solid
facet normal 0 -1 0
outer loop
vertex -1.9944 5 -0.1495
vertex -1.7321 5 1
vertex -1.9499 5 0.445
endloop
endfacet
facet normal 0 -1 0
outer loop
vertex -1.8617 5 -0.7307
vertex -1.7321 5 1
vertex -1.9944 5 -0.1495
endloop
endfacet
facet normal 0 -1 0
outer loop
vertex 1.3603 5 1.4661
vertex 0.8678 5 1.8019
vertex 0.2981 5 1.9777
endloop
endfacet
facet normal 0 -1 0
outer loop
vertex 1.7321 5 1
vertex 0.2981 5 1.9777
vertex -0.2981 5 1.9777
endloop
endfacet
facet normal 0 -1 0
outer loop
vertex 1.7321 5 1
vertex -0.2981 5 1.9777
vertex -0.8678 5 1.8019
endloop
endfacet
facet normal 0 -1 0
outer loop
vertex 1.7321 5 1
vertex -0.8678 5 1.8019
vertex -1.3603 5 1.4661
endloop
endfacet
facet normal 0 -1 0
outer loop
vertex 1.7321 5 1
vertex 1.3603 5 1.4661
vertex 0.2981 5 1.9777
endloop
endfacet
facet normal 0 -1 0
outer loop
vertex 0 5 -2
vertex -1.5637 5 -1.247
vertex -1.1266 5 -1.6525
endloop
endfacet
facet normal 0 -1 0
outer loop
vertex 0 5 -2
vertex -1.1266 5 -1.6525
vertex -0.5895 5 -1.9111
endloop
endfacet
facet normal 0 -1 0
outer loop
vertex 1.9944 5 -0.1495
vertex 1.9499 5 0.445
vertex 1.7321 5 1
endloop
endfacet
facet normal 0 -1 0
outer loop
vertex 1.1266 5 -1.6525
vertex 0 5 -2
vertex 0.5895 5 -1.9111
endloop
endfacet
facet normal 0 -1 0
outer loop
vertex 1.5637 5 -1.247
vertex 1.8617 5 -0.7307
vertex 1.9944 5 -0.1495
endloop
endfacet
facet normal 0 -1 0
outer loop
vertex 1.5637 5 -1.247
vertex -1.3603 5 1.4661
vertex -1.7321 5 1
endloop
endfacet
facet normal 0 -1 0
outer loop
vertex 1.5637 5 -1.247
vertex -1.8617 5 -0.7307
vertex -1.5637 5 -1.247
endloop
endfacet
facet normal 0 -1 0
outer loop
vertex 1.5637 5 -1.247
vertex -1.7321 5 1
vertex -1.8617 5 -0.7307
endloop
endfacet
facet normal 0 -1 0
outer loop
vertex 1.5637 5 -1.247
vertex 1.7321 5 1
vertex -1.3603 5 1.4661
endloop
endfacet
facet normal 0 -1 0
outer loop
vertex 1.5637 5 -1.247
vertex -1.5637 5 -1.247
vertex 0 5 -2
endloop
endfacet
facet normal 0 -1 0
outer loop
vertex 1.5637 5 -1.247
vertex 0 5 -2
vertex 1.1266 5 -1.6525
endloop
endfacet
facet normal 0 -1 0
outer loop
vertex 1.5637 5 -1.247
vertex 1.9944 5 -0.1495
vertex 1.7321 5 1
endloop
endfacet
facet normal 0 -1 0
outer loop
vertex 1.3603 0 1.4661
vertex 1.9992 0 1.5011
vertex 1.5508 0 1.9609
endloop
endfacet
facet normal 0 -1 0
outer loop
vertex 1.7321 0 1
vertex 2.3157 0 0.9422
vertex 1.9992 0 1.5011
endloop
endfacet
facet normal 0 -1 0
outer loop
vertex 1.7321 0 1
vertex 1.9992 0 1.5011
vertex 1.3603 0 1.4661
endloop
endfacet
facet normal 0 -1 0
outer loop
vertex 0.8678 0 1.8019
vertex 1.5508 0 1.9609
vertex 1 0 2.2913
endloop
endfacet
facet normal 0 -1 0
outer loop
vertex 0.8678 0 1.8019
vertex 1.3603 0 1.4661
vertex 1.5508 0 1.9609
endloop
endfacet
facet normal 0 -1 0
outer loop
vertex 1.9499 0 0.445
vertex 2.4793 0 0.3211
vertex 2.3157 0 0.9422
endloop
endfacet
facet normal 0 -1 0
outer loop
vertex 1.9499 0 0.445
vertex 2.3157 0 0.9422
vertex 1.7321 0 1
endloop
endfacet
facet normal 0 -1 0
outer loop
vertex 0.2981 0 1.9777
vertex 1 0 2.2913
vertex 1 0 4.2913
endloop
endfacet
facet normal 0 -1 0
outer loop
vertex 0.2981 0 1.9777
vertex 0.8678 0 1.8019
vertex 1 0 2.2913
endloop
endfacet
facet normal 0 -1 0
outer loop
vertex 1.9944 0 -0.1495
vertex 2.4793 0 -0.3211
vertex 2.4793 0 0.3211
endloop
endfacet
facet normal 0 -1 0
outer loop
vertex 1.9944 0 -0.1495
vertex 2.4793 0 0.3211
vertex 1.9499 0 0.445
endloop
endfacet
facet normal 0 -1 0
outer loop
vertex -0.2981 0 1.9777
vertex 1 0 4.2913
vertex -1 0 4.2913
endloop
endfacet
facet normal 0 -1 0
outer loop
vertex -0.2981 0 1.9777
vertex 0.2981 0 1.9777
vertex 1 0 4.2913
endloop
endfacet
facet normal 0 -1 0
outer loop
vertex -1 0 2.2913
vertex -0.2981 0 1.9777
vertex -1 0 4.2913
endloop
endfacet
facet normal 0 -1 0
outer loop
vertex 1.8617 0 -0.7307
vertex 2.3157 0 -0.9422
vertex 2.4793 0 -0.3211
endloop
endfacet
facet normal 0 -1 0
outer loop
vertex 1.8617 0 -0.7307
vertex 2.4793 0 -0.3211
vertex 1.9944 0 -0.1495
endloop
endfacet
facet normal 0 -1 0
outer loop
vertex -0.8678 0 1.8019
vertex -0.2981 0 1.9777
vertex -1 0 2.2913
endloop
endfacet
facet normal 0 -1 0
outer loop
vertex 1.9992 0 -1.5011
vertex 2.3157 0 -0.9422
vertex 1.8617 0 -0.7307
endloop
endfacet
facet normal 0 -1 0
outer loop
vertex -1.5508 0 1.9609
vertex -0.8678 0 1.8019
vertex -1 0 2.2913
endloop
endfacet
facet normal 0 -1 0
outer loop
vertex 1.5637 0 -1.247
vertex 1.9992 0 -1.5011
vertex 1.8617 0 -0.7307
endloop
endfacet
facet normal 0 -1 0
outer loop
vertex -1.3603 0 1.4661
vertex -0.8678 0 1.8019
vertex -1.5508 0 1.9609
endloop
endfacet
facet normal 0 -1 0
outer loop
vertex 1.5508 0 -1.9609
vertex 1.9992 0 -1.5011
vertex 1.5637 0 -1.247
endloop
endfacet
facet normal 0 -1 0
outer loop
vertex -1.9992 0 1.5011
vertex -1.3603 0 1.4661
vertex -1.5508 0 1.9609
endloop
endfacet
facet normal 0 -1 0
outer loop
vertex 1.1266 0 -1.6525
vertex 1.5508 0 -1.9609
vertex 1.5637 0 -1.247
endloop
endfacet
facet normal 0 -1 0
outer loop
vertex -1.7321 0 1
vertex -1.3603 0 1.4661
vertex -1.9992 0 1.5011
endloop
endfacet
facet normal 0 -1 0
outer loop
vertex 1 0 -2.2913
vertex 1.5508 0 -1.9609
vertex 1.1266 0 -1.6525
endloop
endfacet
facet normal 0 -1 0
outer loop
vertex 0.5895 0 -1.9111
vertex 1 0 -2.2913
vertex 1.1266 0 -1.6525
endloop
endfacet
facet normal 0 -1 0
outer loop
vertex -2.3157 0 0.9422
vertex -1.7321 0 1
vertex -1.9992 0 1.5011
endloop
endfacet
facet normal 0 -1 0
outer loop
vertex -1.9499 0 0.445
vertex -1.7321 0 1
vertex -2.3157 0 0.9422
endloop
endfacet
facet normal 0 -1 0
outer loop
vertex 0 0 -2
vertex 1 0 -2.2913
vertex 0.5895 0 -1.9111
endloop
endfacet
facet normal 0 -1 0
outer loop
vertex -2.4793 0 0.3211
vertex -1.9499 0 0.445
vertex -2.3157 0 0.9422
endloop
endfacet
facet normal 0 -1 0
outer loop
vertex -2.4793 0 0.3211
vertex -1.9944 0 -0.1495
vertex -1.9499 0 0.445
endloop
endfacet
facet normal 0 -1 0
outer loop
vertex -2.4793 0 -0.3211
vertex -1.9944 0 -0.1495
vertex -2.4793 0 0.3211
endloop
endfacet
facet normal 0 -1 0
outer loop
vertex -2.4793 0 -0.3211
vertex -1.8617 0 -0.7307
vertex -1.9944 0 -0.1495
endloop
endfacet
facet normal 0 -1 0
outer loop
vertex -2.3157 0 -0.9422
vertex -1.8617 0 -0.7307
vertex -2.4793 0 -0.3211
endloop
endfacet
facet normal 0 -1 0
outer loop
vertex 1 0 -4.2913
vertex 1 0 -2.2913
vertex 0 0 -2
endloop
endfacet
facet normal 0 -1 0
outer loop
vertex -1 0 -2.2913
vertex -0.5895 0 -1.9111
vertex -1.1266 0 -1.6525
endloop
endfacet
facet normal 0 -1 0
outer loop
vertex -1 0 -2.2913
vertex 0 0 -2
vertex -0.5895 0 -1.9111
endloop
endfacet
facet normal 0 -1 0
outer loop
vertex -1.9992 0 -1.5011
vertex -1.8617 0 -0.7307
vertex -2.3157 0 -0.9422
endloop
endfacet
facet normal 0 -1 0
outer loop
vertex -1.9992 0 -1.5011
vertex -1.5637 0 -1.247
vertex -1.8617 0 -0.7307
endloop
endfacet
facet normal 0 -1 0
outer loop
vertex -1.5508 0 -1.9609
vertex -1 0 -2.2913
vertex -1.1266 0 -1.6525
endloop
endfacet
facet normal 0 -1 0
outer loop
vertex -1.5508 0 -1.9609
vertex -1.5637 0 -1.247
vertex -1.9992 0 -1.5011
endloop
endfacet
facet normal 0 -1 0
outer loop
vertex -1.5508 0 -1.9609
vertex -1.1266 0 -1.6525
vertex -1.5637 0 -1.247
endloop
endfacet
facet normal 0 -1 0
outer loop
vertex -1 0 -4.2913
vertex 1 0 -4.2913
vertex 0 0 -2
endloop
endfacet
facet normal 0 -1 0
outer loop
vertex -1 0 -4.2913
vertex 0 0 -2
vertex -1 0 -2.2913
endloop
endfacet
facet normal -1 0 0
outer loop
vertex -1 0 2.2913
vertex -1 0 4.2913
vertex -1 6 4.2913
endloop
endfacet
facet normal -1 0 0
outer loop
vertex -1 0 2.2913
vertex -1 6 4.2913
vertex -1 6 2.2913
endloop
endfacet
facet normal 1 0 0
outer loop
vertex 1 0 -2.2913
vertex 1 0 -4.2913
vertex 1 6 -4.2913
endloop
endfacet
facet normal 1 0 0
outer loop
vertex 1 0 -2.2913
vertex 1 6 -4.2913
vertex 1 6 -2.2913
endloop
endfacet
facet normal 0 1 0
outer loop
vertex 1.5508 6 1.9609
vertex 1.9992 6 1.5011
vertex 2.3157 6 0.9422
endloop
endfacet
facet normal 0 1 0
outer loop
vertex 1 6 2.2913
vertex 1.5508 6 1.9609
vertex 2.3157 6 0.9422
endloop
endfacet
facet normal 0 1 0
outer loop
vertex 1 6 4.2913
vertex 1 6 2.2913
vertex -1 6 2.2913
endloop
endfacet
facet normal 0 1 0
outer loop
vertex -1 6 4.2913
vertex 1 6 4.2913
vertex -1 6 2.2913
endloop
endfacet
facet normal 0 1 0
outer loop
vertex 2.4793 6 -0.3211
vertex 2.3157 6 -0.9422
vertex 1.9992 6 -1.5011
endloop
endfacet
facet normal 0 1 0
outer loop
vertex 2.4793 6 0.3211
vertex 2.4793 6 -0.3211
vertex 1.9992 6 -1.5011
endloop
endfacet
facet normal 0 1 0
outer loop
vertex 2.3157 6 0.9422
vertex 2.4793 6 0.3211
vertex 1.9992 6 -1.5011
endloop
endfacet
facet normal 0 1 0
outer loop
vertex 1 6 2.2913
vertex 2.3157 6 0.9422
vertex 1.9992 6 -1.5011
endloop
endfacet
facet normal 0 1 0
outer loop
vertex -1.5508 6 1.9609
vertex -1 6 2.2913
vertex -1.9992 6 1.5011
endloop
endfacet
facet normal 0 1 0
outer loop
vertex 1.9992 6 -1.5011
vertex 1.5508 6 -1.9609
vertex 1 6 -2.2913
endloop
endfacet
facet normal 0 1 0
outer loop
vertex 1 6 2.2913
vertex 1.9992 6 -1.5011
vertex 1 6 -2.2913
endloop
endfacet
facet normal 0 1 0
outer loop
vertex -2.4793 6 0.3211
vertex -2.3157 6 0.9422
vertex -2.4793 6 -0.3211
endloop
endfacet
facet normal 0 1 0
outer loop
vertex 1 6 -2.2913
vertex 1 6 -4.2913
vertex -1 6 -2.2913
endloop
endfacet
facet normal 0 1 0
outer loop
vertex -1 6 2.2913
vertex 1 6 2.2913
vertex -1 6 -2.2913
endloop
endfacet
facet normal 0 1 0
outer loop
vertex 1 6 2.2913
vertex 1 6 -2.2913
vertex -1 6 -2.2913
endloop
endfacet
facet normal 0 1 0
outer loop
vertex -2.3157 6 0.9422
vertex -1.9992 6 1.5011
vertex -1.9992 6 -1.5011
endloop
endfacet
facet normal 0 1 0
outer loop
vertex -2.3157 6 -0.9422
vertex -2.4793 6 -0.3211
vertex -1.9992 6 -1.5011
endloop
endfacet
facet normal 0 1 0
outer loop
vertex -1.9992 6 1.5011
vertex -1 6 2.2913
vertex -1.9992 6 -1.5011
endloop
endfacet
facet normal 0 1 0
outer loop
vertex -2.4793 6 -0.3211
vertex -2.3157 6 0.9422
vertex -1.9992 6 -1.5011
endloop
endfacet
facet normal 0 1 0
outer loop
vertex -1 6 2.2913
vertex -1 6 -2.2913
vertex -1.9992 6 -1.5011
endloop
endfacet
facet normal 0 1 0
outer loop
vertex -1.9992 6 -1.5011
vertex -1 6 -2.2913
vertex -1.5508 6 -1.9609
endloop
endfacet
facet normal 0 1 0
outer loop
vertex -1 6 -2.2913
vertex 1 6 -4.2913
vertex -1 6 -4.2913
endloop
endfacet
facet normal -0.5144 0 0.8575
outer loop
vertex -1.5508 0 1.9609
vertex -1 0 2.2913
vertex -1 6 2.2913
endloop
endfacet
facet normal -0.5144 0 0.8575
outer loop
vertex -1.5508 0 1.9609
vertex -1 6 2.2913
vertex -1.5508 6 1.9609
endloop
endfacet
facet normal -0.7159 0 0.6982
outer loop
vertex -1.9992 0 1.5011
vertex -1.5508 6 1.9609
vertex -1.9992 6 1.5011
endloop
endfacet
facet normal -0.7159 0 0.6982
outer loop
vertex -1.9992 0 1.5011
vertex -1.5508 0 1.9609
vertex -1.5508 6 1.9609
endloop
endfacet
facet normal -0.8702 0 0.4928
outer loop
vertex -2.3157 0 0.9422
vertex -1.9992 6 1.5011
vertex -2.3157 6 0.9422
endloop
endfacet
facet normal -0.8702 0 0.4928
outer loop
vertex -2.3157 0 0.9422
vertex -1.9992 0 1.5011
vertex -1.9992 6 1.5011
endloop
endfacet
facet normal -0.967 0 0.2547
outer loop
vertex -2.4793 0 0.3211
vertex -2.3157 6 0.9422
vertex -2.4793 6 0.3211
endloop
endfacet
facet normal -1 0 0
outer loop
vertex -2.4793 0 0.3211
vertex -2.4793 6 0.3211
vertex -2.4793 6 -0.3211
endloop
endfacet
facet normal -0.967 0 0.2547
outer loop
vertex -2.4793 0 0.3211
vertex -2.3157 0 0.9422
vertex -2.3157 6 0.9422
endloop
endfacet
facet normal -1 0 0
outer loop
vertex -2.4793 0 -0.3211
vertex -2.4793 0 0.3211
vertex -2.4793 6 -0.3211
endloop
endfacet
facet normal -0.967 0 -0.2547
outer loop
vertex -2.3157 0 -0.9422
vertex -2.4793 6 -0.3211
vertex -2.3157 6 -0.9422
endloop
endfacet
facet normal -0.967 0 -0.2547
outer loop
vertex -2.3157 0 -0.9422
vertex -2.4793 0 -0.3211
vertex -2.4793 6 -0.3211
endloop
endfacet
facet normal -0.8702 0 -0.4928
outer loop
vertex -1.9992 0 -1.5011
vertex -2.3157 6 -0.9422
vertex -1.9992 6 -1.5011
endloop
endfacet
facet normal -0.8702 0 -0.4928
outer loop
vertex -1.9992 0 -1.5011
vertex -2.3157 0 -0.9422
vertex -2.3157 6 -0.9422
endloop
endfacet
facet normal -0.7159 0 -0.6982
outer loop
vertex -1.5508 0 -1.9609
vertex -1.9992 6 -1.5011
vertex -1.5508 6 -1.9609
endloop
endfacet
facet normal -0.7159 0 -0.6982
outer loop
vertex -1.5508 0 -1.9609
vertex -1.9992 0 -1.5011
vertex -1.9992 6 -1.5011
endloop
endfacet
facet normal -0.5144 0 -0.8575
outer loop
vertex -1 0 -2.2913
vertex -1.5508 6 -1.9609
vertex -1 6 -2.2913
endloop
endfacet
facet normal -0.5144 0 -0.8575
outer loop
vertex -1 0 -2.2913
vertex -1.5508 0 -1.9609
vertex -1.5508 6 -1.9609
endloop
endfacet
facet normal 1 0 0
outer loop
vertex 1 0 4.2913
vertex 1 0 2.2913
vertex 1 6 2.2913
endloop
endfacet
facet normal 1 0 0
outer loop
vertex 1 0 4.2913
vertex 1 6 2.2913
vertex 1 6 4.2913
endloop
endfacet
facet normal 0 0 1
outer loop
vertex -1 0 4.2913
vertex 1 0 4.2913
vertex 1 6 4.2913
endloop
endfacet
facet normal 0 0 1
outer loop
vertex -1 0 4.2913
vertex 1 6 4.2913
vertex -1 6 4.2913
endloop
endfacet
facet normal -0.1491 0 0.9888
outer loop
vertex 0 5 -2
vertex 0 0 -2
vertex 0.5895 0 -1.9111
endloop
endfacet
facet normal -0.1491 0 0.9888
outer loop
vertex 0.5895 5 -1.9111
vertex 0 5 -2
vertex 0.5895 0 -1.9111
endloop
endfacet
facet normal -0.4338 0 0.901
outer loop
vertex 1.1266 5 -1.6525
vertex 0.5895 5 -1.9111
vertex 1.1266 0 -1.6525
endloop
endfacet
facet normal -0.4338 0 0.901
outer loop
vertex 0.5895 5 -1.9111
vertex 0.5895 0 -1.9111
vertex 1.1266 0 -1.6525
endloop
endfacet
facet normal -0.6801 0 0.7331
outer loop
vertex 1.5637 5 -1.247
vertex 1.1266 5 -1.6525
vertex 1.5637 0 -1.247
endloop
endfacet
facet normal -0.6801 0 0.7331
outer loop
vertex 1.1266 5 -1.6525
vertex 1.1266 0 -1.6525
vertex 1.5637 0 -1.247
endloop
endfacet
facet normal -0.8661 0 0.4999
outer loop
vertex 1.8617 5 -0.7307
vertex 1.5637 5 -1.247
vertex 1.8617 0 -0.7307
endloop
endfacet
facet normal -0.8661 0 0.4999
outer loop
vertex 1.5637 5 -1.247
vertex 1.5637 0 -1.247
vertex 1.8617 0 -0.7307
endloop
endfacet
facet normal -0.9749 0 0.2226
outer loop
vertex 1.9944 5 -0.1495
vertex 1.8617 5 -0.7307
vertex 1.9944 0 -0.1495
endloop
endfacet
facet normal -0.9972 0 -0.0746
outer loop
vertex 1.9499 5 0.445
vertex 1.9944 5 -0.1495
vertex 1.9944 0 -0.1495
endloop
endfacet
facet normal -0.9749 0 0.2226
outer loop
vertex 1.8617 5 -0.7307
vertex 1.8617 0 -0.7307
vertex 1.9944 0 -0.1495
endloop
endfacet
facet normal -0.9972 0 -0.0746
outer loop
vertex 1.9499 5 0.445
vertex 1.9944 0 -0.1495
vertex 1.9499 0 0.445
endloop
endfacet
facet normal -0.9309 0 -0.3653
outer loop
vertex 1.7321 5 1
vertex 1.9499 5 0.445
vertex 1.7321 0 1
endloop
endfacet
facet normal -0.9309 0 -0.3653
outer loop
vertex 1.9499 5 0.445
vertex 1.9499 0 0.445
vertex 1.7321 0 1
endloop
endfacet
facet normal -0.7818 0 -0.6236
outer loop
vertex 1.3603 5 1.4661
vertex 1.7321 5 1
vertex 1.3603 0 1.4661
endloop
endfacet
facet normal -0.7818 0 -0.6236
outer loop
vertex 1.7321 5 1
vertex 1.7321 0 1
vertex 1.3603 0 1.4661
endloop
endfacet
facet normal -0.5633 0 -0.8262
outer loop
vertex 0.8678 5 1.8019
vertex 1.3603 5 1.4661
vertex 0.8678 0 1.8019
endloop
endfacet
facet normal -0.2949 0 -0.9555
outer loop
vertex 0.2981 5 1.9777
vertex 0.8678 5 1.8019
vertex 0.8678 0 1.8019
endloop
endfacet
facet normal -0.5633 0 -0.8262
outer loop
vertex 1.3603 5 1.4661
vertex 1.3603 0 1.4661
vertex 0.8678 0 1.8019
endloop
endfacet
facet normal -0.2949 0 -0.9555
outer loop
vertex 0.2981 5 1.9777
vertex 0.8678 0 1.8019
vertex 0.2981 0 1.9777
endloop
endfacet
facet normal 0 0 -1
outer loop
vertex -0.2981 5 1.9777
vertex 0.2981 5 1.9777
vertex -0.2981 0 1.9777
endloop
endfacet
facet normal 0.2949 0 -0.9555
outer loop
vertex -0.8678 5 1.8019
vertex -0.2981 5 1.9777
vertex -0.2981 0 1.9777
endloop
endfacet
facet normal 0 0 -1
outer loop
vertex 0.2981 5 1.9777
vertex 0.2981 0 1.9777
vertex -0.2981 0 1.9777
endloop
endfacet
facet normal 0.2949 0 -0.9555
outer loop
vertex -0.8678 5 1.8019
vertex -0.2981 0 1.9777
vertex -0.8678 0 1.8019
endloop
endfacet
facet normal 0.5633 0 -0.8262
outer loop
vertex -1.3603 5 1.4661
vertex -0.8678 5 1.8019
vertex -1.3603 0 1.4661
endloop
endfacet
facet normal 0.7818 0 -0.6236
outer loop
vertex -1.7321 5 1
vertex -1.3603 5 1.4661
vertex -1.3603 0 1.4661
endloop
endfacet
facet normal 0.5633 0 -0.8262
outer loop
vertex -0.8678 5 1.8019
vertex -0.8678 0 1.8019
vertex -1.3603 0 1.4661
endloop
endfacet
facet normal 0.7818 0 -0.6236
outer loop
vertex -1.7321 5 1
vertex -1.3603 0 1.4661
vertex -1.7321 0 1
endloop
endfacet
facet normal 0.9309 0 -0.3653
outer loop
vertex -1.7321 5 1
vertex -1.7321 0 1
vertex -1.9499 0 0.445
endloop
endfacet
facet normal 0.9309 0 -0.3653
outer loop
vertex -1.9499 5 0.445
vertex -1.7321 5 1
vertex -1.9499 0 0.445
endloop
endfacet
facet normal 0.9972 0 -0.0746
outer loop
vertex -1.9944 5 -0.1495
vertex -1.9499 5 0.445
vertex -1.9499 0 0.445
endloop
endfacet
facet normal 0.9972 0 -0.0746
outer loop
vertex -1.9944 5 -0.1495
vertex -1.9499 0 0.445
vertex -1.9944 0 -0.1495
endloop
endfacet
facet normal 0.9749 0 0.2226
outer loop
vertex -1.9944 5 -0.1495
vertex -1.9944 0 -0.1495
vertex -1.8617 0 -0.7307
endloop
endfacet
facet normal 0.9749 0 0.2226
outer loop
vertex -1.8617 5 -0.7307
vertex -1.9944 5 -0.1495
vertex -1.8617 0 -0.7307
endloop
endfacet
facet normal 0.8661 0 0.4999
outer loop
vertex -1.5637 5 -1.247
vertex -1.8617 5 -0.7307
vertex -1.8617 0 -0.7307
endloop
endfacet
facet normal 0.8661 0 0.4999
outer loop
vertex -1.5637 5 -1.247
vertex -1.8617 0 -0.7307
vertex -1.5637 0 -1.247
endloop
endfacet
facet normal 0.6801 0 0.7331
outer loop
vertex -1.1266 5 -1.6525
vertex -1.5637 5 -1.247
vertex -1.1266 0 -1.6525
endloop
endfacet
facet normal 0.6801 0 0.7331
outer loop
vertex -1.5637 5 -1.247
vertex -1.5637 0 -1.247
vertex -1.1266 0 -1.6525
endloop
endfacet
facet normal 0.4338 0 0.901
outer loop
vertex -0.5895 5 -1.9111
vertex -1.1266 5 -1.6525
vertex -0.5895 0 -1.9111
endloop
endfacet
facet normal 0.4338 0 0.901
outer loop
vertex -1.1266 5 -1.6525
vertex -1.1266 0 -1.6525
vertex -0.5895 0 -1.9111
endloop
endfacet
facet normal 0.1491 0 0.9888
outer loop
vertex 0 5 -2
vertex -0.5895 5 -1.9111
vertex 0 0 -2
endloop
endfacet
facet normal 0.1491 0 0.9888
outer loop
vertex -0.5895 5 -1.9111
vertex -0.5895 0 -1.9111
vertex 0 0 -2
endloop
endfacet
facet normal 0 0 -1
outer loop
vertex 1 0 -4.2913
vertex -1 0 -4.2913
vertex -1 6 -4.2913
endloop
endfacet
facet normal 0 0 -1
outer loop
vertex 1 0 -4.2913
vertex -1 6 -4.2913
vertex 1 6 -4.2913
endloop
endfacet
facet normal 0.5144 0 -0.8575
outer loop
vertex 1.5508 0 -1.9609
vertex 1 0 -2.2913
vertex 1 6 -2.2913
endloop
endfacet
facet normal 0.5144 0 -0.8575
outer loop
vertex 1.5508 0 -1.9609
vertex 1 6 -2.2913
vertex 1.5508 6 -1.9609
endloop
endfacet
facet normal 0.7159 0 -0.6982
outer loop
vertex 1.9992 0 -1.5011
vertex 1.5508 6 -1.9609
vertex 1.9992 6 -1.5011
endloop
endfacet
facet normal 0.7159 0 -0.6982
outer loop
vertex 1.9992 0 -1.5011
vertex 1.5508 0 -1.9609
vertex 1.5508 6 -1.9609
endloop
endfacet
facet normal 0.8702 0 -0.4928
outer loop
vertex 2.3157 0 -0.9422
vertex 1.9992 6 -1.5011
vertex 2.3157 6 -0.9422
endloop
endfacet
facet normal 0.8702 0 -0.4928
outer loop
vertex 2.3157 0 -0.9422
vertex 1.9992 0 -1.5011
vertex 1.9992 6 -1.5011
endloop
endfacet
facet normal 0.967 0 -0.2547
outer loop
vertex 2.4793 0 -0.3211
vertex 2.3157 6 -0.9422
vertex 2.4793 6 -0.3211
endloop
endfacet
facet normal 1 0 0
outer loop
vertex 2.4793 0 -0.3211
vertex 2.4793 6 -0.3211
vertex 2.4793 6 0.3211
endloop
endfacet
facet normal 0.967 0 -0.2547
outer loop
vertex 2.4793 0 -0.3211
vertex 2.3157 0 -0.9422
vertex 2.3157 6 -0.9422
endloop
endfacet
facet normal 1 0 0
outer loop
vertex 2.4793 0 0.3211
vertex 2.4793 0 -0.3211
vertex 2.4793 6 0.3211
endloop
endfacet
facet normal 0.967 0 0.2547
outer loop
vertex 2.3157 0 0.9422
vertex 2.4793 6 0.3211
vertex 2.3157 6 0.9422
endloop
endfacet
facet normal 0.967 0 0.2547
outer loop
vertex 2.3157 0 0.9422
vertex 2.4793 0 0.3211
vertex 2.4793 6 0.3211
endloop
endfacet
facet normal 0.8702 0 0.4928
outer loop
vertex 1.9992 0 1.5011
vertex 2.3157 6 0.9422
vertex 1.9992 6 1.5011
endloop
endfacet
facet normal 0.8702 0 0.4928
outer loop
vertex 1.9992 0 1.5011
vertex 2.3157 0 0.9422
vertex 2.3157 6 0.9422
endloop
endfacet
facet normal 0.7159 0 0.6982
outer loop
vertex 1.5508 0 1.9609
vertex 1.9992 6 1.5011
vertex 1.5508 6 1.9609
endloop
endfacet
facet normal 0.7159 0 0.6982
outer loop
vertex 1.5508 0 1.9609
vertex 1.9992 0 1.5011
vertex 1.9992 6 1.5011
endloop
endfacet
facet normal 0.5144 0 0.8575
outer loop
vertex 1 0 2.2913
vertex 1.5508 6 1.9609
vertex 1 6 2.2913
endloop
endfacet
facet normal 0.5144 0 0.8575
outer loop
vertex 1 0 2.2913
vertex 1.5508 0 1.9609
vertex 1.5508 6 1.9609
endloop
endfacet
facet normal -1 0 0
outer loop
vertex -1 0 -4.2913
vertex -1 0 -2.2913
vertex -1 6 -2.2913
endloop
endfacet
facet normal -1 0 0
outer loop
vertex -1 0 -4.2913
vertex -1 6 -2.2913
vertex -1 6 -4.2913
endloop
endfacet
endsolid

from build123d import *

# Parameters (mm, degrees)
BOSS_EXTRUDE1_DEPTH = 6
SKETCH3_R           = 2
CUT_EXTRUDE1_DEPTH  = 5


with BuildPart() as part:
    # Sketch1 → Boss-Extrude1 (new body)
    with BuildSketch(Plane(origin=(0, 0, 0), x_dir=(1, 0, 0), z_dir=(0, 1, 0))):
        with BuildLine():
            Line((-1, 2.291287847), (-1, 4.291287847))
            Line((-1, 4.291287847), (1, 4.291287847))
            Line((1, 4.291287847), (1, 2.291287847))
            ThreePointArc((1, 2.291287847), (2.5, 0), (1, -2.291287847))
            Line((1, -2.291287847), (1, -4.291287847))
            Line((1, -4.291287847), (-1, -4.291287847))
            Line((-1, -4.291287847), (-1, -2.291287847))
            ThreePointArc((-1, -2.291287847), (-2.5, 0), (-1, 2.291287847))
        make_face()
    extrude(amount=BOSS_EXTRUDE1_DEPTH)

    # Sketch3 → Cut-Extrude1 (cut)
    with BuildSketch(Plane.XZ):
        with Locations(Location((0, 0, 0), (0, 0, 270))):
            Circle(SKETCH3_R)
    extrude(amount=-CUT_EXTRUDE1_DEPTH, mode=Mode.SUBTRACT)


solid = part.part
